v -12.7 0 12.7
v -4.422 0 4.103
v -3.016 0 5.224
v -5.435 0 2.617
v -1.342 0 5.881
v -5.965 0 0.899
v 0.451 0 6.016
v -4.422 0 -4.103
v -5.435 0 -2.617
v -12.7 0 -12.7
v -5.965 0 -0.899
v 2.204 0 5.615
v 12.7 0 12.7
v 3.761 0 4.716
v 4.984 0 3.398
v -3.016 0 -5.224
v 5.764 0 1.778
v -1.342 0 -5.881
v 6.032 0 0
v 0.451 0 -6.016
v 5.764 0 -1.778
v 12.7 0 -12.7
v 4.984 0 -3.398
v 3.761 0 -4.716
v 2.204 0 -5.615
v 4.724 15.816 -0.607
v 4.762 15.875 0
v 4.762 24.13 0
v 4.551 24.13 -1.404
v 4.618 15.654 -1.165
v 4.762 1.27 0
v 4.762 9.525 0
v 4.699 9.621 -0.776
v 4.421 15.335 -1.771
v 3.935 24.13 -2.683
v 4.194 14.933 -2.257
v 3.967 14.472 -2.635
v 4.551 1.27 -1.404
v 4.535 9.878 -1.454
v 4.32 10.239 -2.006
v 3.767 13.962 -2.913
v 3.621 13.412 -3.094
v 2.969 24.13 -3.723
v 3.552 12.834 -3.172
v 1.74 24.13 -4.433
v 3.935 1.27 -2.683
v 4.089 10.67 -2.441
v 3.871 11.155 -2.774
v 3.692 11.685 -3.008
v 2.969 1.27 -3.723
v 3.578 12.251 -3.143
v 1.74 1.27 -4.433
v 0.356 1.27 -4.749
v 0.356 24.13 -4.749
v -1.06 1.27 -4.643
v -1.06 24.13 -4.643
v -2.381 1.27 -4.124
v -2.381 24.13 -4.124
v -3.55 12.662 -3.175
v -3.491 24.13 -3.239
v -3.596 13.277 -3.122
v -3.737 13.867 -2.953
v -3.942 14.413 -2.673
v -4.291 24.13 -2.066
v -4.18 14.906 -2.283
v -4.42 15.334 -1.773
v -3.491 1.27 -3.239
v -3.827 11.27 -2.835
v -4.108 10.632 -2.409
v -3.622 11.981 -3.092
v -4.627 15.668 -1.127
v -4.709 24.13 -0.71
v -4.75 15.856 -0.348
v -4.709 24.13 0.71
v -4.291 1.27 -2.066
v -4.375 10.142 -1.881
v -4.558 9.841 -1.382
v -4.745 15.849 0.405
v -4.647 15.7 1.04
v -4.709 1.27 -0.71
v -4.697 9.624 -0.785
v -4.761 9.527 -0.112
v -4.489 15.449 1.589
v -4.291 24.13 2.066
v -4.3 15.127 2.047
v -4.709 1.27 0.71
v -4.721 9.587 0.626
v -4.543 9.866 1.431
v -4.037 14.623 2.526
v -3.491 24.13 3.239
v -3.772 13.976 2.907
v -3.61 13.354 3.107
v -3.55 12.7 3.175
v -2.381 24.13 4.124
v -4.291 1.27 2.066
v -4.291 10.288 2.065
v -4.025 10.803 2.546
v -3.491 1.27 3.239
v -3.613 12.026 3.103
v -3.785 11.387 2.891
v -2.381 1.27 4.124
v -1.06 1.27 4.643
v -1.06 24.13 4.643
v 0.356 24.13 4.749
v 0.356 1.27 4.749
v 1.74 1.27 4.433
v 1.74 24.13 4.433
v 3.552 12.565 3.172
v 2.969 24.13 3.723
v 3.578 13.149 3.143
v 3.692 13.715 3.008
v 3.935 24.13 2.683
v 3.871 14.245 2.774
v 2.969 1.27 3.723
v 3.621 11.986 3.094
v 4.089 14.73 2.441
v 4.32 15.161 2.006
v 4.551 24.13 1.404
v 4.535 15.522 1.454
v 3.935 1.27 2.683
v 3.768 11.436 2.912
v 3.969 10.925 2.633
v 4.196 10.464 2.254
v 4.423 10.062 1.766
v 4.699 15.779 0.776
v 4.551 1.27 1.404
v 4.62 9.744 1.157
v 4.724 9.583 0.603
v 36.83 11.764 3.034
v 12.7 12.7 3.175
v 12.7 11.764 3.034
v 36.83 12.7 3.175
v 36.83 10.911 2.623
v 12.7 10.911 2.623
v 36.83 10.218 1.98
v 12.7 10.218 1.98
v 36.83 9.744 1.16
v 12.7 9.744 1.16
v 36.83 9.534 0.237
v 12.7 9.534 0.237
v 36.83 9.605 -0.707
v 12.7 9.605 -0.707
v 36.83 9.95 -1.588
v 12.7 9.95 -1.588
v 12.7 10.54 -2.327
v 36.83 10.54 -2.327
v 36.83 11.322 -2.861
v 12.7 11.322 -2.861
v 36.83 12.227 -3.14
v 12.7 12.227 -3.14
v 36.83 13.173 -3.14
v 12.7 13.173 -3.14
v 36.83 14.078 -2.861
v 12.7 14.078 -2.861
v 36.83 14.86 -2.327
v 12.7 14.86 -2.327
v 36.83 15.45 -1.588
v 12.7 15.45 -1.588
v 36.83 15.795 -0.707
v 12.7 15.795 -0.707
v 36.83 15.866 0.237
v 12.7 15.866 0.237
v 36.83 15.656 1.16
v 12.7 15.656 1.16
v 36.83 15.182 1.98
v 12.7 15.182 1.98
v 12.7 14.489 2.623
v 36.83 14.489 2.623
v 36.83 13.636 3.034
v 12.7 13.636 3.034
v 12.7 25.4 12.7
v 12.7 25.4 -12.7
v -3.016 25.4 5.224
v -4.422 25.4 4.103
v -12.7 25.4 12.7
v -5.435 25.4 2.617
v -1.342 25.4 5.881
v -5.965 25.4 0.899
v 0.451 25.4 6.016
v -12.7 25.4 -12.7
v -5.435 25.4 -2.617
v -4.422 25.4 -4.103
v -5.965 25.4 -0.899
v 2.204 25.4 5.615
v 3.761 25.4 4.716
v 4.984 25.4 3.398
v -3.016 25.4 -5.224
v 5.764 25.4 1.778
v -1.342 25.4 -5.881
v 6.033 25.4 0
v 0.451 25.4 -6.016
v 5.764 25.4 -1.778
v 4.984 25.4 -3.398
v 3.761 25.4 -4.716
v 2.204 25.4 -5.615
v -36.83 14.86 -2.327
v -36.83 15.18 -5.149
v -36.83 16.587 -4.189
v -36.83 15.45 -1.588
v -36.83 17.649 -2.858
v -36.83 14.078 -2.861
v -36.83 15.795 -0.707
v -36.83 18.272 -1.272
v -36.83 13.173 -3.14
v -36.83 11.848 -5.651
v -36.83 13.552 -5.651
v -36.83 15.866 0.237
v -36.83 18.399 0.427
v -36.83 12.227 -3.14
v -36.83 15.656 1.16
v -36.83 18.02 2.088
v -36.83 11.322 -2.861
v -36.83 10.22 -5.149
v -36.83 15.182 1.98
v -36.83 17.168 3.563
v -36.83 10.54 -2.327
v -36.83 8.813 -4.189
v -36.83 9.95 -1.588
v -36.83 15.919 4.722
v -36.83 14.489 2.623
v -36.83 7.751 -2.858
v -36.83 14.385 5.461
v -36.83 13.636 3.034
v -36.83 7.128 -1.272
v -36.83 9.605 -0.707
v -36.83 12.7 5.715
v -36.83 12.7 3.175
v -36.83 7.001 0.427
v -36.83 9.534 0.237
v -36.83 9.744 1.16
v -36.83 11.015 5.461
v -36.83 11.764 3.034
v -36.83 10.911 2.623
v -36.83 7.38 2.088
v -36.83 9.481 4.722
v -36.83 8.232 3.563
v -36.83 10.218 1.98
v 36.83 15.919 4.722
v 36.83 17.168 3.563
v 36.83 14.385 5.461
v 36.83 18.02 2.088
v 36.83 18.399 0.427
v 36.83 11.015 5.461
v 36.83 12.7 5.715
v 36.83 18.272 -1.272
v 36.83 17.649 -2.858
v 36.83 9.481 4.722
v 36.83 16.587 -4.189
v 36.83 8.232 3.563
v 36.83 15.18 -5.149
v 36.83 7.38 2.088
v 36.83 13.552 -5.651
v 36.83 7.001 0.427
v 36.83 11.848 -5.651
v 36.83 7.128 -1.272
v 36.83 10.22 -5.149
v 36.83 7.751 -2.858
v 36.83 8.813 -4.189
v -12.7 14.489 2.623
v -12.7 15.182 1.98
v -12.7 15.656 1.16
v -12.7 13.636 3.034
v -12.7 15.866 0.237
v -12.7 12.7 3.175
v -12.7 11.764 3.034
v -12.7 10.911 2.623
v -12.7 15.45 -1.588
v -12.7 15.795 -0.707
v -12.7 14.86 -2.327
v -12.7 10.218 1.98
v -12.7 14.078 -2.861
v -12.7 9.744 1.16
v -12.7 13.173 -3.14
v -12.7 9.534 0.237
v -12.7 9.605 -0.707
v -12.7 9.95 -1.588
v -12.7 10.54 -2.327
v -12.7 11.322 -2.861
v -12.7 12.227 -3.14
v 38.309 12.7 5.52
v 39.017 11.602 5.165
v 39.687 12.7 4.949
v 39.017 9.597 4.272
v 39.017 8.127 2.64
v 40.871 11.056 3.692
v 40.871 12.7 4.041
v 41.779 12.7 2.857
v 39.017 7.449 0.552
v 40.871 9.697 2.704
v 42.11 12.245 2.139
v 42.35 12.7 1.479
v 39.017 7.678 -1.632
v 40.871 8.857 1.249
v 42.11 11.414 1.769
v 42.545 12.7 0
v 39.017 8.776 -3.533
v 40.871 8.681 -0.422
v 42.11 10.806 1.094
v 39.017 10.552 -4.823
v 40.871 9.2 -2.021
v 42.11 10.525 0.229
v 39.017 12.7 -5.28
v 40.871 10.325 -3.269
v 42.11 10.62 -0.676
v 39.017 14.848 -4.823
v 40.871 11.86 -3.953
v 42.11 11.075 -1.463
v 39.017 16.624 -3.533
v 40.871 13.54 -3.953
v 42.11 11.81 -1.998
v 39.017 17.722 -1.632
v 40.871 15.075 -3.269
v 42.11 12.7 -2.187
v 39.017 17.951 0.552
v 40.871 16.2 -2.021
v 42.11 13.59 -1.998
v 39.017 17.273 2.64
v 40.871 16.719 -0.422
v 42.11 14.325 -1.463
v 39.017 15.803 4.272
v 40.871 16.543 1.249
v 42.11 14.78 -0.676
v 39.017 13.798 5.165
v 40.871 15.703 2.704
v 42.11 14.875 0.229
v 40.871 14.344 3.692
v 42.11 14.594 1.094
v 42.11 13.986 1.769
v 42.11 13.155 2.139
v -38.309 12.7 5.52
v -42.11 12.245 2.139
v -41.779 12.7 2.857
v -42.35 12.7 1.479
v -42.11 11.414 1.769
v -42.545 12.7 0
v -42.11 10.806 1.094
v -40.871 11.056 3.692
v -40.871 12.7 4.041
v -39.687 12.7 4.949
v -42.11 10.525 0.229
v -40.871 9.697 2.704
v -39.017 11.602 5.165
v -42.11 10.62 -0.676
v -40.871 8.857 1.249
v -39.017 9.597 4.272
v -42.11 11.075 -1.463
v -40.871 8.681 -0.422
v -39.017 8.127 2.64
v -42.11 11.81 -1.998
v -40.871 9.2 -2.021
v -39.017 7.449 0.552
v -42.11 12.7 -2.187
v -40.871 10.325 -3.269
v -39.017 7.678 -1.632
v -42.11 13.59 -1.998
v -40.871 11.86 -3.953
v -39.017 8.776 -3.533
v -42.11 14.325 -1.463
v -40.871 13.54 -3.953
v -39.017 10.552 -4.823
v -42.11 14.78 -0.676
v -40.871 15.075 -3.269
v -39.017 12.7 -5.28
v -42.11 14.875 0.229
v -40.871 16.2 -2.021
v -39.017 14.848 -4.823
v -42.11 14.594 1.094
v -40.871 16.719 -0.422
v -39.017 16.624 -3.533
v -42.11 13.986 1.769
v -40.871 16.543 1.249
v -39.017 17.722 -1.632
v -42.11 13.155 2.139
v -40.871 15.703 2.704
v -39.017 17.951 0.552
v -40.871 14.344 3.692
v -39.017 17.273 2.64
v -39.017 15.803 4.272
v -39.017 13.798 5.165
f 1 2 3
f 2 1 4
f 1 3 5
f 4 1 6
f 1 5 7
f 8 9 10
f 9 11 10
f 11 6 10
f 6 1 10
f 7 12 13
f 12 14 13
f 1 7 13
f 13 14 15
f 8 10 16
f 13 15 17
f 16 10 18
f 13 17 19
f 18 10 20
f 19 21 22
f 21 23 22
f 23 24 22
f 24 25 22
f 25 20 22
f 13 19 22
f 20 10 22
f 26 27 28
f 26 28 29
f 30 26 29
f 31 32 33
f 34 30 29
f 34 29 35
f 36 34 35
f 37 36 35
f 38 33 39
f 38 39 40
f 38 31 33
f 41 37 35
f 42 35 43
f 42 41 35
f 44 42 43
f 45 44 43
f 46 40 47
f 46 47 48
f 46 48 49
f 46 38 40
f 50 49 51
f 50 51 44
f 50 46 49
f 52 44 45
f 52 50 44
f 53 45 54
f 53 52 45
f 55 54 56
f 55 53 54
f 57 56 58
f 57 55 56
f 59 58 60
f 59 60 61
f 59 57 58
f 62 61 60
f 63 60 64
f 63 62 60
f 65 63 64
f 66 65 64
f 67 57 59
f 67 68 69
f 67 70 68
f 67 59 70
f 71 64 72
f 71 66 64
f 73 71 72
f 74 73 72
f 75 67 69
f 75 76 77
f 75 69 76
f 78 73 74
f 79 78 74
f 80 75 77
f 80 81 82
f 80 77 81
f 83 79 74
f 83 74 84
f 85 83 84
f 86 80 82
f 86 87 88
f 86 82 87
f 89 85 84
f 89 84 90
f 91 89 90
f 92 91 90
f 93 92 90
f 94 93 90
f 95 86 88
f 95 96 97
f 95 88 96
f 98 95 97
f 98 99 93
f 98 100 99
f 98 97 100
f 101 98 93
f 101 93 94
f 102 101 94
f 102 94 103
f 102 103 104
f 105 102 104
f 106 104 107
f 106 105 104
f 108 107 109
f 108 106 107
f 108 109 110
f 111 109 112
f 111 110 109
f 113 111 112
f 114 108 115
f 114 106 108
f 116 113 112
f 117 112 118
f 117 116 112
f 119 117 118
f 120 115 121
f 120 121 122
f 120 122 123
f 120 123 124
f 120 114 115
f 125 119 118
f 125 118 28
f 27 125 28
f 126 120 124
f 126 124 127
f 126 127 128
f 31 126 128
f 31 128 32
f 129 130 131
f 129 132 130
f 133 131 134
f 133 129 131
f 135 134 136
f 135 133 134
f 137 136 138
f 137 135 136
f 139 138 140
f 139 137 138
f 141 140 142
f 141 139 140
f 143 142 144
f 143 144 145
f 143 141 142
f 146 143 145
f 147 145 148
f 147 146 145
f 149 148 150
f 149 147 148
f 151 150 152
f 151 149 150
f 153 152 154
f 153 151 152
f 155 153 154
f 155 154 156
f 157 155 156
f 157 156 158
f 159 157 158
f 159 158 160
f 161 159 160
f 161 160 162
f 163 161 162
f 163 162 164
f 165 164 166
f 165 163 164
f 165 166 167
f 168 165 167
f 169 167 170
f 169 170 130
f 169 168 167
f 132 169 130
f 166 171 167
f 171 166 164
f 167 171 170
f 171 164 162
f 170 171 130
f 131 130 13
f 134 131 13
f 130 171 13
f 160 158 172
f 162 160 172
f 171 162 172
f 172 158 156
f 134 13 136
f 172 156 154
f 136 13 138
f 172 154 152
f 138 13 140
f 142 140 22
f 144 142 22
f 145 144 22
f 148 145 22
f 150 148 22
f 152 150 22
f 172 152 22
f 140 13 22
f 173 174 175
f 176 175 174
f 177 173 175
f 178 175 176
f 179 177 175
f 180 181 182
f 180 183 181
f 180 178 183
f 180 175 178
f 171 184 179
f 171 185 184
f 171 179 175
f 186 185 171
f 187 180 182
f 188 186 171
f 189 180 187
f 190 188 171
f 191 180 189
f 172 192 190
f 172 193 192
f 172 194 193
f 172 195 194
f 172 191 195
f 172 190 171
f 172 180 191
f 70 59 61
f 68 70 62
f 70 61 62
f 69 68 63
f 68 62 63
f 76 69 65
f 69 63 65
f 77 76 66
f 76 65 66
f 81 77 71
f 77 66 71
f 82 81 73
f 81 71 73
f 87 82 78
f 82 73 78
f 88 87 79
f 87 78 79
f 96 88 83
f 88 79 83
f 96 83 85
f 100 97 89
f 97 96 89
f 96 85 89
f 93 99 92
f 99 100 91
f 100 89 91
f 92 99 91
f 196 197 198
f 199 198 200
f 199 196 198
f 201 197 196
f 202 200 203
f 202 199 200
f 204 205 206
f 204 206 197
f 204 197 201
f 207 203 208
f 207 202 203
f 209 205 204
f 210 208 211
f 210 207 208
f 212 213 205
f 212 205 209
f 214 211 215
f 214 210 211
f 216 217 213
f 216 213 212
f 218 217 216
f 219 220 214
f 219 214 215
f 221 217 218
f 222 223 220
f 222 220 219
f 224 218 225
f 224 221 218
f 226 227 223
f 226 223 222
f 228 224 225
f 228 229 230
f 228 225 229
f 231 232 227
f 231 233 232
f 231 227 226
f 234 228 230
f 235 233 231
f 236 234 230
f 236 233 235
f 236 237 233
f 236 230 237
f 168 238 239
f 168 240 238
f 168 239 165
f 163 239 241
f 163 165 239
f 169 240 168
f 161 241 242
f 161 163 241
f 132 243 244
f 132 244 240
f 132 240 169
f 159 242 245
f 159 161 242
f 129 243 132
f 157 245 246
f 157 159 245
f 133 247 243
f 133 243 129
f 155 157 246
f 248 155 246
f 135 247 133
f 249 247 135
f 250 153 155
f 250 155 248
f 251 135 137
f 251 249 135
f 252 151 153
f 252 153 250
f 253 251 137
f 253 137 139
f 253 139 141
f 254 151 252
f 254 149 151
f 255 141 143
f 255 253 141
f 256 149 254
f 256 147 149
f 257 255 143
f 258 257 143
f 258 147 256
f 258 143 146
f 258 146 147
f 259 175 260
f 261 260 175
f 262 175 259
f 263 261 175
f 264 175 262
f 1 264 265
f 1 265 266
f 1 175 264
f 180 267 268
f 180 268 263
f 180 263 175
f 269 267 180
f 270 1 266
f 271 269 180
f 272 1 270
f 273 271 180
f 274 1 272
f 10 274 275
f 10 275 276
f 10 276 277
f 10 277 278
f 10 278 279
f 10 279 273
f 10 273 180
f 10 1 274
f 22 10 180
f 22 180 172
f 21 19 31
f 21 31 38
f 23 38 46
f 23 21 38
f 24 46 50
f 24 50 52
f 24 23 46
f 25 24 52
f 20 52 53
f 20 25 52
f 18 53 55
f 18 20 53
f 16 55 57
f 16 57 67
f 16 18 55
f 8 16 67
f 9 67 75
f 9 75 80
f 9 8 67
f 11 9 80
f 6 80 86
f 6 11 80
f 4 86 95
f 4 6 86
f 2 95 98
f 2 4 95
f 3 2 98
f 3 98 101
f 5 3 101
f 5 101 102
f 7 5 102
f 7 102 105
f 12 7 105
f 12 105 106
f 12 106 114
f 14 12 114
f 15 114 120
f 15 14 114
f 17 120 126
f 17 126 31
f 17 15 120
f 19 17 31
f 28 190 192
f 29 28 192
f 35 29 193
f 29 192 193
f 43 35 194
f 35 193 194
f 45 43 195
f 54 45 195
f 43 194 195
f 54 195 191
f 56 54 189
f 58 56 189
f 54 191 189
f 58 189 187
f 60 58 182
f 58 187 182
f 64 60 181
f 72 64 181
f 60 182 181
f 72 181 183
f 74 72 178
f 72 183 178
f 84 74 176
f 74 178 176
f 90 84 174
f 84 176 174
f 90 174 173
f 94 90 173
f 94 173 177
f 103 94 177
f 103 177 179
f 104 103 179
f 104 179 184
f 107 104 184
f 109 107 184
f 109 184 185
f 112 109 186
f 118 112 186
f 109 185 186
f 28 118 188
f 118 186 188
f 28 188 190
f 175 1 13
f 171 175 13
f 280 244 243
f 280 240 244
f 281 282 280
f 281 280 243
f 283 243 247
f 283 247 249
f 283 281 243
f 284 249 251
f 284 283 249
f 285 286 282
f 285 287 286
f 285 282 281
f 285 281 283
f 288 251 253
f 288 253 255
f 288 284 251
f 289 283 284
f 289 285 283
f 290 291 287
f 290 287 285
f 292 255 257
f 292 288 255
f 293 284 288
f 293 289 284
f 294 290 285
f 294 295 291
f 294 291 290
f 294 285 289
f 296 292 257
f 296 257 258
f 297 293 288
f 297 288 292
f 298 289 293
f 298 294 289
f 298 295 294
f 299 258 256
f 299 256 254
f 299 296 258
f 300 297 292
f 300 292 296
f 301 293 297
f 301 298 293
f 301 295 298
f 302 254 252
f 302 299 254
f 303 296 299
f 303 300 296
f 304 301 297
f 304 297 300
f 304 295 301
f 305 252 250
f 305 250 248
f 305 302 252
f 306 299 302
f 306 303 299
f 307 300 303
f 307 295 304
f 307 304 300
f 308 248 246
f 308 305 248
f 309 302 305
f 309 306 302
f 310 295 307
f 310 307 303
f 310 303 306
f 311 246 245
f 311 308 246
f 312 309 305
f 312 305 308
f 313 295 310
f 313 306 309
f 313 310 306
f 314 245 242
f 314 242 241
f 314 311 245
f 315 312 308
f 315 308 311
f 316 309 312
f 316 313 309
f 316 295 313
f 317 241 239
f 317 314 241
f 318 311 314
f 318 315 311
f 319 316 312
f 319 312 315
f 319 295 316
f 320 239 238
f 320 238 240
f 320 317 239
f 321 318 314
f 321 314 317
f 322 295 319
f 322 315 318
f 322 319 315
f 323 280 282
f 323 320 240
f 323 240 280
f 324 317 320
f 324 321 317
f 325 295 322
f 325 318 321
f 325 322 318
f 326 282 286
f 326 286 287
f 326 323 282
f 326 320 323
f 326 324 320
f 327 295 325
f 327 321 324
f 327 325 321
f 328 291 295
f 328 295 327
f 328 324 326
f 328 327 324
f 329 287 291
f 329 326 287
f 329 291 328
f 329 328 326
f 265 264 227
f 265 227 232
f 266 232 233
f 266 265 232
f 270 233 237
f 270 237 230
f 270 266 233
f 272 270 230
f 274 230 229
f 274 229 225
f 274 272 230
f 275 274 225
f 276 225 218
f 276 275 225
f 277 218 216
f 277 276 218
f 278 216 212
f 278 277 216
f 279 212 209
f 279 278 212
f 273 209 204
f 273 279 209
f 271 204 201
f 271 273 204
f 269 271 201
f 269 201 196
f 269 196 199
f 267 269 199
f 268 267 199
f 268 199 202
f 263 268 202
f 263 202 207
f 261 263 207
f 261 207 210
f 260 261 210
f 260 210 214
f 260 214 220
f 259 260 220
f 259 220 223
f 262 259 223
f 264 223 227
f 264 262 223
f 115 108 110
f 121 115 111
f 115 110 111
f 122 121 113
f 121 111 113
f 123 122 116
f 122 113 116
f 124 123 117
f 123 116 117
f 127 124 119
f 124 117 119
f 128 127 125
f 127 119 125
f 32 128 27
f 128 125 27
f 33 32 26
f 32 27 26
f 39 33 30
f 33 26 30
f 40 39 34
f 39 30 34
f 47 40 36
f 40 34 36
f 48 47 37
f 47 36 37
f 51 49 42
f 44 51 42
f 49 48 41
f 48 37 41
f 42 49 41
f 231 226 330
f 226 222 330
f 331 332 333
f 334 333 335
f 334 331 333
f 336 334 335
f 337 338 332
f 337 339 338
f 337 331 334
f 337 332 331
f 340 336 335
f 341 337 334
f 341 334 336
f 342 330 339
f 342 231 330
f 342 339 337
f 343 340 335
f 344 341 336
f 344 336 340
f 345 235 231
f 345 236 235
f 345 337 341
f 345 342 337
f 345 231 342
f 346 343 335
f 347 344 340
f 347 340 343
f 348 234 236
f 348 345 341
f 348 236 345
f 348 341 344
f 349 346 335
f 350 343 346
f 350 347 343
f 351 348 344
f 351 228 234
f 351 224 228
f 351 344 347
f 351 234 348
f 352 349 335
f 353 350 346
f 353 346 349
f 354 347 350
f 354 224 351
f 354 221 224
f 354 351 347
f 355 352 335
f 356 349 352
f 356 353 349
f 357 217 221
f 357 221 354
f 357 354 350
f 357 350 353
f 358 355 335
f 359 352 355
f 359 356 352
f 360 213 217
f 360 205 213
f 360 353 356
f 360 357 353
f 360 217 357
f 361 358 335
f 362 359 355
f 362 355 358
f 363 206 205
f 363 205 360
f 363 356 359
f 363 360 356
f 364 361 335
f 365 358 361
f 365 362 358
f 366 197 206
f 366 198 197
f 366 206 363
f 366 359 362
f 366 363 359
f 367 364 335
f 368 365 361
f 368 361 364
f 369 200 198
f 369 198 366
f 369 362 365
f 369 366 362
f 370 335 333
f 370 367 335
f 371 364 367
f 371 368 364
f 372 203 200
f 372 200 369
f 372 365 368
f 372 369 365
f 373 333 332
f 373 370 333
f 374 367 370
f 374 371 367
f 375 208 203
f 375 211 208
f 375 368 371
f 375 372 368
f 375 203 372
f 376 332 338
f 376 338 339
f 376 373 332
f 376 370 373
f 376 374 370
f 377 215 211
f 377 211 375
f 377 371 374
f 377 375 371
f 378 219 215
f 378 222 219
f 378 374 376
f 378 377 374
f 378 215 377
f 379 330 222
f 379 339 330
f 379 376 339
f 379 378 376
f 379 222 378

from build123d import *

# Parameters (mm, degrees)
SKETCH1_W           = 25.4
SKETCH1_H           = 25.4
SKETCH1_R           = 4.7625
BOSS_EXTRUDE1_DEPTH = 25.4
CHAMFER1_SIZE       = 1.27
SKETCH3_R           = 4.7625
CUT_EXTRUDE1_DEPTH  = 26.4


with BuildPart() as part:
    # Sketch1 → Boss-Extrude1 (new body)
    with BuildSketch(Plane(origin=(0, 0, 0), x_dir=(1, 0, 0), z_dir=(0, 1, 0))):
        Rectangle(SKETCH1_W, SKETCH1_H)
        Circle(SKETCH1_R, mode=Mode.SUBTRACT)
    extrude(amount=BOSS_EXTRUDE1_DEPTH)

    # Chamfer1
    chamfer1_edges = [part.edges().sort_by_distance(p)[0] for p in [
        (-4.7625, 0, 0),
        (-4.7625, 25.4, 0),
    ]]
    chamfer(chamfer1_edges, length=CHAMFER1_SIZE)

    # Sketch2 → Revolve1 (revolve)
    with BuildSketch(Plane(origin=(0, 12.7, 0), x_dir=(1, 0, 0), z_dir=(0, 1, 0))):
        with BuildLine():
            Line((-36.83, -3.175), (36.83, -3.175))
            Line((36.83, -3.175), (36.83, -5.715))
            ThreePointArc((36.83, -5.715), (40.871115254, -4.041115254), (42.545, 0))
            Line((42.545, 0), (-42.545, 0))
            ThreePointArc((-42.545, 0), (-40.871115254, -4.041115254), (-36.83, -5.715))
            Line((-36.83, -5.715), (-36.83, -3.175))
        make_face()
    revolve(axis=Axis((-42.545, 12.7, 0), (1, 0, 0)))

    # Sketch3 → Cut-Extrude1 (cut, through all)
    with BuildSketch(Plane(origin=(0, 25.4, 0), x_dir=(1, 0, 0), z_dir=(0, 1, 0))):
        Circle(SKETCH3_R)
    extrude(amount=-CUT_EXTRUDE1_DEPTH, mode=Mode.SUBTRACT)


solid = part.part
